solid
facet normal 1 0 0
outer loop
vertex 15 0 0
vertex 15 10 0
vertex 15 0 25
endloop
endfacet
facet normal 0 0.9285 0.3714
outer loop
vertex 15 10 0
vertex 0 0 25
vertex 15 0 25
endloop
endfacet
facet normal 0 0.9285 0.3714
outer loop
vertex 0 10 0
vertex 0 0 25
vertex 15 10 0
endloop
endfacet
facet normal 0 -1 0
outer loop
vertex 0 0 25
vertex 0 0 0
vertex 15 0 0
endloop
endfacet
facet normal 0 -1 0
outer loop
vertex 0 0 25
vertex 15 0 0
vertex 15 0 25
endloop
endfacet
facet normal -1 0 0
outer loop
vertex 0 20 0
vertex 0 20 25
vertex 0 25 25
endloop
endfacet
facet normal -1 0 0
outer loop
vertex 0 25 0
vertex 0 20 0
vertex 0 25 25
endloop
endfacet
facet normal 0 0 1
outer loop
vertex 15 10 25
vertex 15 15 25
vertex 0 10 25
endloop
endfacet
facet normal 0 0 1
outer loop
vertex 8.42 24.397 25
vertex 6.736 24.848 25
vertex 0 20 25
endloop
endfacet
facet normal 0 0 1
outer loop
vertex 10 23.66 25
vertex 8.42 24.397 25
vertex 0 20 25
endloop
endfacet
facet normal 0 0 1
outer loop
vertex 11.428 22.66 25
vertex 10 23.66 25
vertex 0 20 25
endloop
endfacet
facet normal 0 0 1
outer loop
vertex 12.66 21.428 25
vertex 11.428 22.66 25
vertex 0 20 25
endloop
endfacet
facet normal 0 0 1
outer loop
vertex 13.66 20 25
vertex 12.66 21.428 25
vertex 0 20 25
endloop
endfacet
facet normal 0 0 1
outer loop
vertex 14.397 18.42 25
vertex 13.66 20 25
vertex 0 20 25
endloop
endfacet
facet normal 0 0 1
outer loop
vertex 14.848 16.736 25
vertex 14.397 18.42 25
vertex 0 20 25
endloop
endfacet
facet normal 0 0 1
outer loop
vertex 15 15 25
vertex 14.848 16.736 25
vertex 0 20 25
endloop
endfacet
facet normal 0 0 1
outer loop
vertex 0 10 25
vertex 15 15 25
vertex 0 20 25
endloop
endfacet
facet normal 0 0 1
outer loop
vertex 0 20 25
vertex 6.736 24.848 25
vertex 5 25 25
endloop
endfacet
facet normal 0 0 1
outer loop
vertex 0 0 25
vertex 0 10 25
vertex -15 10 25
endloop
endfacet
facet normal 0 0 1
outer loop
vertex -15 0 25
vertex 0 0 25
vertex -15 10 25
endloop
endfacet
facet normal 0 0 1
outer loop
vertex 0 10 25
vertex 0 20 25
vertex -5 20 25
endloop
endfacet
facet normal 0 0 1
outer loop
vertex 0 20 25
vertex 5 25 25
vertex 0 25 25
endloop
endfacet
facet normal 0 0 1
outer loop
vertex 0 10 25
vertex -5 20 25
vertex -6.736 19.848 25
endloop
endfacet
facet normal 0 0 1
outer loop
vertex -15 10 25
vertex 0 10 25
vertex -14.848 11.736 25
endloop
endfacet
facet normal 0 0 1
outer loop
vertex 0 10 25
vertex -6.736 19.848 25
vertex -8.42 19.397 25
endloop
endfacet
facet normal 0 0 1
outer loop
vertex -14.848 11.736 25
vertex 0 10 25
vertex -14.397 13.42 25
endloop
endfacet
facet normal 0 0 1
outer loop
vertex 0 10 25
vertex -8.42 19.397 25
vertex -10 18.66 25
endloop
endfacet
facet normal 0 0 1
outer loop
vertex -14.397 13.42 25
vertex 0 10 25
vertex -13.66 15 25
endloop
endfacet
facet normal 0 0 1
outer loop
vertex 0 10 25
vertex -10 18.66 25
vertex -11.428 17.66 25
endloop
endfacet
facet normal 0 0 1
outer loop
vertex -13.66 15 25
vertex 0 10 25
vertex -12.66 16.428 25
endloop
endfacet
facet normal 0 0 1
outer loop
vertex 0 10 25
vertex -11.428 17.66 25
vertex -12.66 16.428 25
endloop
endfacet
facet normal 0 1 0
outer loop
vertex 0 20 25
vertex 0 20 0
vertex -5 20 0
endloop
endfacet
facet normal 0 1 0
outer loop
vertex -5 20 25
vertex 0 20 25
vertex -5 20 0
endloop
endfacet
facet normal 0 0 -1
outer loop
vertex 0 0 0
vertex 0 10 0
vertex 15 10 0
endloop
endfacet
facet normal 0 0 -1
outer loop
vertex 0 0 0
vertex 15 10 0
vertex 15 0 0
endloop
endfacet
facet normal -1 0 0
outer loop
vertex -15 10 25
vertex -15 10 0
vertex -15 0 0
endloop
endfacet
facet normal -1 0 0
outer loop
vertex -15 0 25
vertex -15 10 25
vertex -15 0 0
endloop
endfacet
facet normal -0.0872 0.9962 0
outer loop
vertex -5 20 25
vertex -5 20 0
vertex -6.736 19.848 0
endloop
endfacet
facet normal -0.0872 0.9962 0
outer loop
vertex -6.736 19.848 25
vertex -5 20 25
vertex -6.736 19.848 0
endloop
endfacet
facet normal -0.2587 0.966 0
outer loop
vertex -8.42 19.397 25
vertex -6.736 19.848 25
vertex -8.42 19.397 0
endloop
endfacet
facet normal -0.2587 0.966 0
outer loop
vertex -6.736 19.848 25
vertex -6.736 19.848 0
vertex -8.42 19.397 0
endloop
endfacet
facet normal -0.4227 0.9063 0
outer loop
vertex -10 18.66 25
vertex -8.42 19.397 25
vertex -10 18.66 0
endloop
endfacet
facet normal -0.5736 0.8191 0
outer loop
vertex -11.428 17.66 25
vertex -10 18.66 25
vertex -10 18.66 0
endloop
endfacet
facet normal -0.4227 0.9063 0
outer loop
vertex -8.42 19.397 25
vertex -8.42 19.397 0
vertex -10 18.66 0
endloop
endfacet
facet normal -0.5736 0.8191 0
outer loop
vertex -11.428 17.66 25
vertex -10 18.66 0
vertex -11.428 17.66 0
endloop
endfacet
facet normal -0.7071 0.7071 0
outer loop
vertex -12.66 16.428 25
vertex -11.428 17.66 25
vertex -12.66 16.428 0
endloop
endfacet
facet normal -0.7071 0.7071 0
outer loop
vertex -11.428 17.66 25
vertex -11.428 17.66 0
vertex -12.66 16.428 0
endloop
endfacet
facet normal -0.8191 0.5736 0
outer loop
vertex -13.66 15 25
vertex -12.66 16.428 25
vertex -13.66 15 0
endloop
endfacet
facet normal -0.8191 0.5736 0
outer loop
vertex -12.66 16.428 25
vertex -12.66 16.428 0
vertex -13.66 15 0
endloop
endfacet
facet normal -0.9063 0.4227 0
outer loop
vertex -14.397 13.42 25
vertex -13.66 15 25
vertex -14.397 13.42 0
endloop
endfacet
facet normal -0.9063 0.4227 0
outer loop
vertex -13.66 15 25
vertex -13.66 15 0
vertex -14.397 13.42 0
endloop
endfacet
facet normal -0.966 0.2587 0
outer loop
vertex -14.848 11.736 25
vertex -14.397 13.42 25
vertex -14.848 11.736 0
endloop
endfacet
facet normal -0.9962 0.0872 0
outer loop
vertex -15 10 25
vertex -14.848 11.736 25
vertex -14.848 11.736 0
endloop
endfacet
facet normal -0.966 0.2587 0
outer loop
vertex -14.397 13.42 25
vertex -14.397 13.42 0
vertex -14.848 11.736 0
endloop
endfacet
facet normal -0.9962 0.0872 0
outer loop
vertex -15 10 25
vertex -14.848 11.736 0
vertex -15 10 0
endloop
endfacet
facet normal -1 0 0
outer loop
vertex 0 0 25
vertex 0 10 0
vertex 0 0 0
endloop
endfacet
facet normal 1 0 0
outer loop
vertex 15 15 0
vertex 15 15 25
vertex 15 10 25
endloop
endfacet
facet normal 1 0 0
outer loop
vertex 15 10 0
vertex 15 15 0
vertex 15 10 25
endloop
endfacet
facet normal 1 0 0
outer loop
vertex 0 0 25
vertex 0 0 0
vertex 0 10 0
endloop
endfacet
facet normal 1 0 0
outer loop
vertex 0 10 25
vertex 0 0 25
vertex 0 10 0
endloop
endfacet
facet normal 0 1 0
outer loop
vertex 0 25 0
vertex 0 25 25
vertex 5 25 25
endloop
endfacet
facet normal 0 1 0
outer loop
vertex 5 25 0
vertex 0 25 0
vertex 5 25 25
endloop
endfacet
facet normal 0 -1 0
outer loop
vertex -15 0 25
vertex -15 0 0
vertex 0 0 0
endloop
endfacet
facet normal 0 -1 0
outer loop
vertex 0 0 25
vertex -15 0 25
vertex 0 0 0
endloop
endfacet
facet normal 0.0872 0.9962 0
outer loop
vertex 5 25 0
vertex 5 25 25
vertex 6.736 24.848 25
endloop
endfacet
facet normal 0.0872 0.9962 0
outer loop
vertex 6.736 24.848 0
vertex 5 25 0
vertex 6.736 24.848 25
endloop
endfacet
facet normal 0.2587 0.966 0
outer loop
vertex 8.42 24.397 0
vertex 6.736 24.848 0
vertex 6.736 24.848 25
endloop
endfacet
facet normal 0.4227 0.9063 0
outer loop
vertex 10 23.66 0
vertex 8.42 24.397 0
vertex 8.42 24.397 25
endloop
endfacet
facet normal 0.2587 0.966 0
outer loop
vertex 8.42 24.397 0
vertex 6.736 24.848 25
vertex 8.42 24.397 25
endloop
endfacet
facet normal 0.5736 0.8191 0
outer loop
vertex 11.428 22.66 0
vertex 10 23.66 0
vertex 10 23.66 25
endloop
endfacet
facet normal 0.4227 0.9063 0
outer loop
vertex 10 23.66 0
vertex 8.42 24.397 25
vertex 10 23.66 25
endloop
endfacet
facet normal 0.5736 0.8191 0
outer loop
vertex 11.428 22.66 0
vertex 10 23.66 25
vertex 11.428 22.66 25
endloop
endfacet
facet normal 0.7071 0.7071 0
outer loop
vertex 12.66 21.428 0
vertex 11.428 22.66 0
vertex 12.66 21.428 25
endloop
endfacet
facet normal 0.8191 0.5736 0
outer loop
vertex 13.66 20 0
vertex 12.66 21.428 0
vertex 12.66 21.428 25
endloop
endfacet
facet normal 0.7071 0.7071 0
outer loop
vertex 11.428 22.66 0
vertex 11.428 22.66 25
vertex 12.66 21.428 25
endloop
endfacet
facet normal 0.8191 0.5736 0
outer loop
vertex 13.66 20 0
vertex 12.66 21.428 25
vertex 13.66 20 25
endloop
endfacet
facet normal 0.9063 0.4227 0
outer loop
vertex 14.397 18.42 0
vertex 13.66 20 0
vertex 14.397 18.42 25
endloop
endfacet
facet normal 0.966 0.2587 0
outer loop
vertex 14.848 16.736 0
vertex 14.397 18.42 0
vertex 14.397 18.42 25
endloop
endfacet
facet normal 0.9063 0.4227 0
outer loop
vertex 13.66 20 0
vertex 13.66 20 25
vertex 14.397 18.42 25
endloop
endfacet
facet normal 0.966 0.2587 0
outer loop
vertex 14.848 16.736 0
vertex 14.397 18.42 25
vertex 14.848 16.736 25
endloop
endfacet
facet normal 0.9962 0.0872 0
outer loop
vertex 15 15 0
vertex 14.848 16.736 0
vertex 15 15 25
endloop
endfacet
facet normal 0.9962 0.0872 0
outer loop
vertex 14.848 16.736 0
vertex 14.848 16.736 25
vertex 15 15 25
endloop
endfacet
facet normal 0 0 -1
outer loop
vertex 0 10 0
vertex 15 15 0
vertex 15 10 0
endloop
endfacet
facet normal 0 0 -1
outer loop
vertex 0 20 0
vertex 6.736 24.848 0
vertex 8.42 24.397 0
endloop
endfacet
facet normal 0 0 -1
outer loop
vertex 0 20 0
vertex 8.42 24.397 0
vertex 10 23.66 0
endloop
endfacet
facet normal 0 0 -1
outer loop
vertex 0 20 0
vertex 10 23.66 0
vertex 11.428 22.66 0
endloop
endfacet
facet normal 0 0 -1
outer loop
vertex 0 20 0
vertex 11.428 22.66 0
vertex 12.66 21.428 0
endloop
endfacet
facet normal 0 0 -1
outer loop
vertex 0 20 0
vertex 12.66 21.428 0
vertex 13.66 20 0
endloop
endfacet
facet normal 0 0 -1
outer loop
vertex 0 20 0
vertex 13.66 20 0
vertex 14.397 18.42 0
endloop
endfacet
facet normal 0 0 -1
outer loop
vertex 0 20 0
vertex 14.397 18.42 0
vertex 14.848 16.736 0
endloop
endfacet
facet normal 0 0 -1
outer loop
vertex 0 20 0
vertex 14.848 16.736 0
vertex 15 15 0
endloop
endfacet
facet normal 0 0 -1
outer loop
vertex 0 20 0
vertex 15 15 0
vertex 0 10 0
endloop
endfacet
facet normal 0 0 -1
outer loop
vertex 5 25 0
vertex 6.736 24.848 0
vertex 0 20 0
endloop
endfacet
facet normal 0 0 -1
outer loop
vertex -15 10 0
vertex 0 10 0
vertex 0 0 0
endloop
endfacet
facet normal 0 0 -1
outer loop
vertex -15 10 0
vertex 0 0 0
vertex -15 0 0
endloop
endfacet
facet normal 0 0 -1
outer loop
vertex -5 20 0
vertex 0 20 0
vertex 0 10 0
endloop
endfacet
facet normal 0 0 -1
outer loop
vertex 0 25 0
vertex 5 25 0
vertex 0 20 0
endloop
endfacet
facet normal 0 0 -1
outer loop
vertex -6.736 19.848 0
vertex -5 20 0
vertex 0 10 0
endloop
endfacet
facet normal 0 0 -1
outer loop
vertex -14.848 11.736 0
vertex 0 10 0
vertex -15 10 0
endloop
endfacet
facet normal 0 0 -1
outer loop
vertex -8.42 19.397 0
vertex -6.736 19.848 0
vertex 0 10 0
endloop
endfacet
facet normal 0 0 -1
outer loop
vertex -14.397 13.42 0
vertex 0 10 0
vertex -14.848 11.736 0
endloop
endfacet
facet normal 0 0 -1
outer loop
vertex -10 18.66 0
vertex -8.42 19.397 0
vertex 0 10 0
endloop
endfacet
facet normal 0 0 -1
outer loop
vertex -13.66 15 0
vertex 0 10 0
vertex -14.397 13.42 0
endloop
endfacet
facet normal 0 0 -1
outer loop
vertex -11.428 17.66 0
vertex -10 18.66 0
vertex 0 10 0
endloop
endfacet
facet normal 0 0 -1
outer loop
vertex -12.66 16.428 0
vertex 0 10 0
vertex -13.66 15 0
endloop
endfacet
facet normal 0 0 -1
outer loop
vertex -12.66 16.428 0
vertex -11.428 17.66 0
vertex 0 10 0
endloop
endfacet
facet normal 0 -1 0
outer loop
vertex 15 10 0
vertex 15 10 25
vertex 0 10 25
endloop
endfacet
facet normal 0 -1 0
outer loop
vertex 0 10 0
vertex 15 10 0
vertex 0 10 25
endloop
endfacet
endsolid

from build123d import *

# Parameters (mm, degrees)
BOSS_EXTRUDE1_DEPTH = 25
BOSS_EXTRUDE3_DEPTH = 25
BOSS_EXTRUDE5_DEPTH = 15


with BuildPart() as part:
    # Sketch1 → Boss-Extrude1 (new body)
    with BuildSketch(Plane.XY):
        with BuildLine():
            Line((-15, 0), (0, 0))
            Line((0, 0), (0, 20))
            Line((0, 20), (-5, 20))
            ThreePointArc((-5, 20), (-12.071067812, 17.071067812), (-15, 10))
            Line((-15, 10), (-15, 0))
        make_face()
    extrude(amount=BOSS_EXTRUDE1_DEPTH)

    # Sketch2 → Boss-Extrude3 (add)
    with BuildSketch(Plane.XY.offset(25)):
        with BuildLine():
            Line((0, 10), (0, 25))
            Line((0, 25), (5, 25))
            ThreePointArc((5, 25), (12.071067812, 22.071067812), (15, 15))
            Line((15, 15), (15, 10))
            Line((15, 10), (0, 10))
        make_face()
    extrude(amount=-BOSS_EXTRUDE3_DEPTH)


with BuildPart() as body_2:
    # Sketch3 → Boss-Extrude5 (new body)
    with BuildSketch(Plane(origin=(0, 0, 0), x_dir=(0, 0, -1), z_dir=(1, 0, 0))):
        Polygon((-25, 0), (0, 10), (0, 0), align=None)
    extrude(amount=BOSS_EXTRUDE5_DEPTH)


solid = Compound([part.part, body_2.part])
